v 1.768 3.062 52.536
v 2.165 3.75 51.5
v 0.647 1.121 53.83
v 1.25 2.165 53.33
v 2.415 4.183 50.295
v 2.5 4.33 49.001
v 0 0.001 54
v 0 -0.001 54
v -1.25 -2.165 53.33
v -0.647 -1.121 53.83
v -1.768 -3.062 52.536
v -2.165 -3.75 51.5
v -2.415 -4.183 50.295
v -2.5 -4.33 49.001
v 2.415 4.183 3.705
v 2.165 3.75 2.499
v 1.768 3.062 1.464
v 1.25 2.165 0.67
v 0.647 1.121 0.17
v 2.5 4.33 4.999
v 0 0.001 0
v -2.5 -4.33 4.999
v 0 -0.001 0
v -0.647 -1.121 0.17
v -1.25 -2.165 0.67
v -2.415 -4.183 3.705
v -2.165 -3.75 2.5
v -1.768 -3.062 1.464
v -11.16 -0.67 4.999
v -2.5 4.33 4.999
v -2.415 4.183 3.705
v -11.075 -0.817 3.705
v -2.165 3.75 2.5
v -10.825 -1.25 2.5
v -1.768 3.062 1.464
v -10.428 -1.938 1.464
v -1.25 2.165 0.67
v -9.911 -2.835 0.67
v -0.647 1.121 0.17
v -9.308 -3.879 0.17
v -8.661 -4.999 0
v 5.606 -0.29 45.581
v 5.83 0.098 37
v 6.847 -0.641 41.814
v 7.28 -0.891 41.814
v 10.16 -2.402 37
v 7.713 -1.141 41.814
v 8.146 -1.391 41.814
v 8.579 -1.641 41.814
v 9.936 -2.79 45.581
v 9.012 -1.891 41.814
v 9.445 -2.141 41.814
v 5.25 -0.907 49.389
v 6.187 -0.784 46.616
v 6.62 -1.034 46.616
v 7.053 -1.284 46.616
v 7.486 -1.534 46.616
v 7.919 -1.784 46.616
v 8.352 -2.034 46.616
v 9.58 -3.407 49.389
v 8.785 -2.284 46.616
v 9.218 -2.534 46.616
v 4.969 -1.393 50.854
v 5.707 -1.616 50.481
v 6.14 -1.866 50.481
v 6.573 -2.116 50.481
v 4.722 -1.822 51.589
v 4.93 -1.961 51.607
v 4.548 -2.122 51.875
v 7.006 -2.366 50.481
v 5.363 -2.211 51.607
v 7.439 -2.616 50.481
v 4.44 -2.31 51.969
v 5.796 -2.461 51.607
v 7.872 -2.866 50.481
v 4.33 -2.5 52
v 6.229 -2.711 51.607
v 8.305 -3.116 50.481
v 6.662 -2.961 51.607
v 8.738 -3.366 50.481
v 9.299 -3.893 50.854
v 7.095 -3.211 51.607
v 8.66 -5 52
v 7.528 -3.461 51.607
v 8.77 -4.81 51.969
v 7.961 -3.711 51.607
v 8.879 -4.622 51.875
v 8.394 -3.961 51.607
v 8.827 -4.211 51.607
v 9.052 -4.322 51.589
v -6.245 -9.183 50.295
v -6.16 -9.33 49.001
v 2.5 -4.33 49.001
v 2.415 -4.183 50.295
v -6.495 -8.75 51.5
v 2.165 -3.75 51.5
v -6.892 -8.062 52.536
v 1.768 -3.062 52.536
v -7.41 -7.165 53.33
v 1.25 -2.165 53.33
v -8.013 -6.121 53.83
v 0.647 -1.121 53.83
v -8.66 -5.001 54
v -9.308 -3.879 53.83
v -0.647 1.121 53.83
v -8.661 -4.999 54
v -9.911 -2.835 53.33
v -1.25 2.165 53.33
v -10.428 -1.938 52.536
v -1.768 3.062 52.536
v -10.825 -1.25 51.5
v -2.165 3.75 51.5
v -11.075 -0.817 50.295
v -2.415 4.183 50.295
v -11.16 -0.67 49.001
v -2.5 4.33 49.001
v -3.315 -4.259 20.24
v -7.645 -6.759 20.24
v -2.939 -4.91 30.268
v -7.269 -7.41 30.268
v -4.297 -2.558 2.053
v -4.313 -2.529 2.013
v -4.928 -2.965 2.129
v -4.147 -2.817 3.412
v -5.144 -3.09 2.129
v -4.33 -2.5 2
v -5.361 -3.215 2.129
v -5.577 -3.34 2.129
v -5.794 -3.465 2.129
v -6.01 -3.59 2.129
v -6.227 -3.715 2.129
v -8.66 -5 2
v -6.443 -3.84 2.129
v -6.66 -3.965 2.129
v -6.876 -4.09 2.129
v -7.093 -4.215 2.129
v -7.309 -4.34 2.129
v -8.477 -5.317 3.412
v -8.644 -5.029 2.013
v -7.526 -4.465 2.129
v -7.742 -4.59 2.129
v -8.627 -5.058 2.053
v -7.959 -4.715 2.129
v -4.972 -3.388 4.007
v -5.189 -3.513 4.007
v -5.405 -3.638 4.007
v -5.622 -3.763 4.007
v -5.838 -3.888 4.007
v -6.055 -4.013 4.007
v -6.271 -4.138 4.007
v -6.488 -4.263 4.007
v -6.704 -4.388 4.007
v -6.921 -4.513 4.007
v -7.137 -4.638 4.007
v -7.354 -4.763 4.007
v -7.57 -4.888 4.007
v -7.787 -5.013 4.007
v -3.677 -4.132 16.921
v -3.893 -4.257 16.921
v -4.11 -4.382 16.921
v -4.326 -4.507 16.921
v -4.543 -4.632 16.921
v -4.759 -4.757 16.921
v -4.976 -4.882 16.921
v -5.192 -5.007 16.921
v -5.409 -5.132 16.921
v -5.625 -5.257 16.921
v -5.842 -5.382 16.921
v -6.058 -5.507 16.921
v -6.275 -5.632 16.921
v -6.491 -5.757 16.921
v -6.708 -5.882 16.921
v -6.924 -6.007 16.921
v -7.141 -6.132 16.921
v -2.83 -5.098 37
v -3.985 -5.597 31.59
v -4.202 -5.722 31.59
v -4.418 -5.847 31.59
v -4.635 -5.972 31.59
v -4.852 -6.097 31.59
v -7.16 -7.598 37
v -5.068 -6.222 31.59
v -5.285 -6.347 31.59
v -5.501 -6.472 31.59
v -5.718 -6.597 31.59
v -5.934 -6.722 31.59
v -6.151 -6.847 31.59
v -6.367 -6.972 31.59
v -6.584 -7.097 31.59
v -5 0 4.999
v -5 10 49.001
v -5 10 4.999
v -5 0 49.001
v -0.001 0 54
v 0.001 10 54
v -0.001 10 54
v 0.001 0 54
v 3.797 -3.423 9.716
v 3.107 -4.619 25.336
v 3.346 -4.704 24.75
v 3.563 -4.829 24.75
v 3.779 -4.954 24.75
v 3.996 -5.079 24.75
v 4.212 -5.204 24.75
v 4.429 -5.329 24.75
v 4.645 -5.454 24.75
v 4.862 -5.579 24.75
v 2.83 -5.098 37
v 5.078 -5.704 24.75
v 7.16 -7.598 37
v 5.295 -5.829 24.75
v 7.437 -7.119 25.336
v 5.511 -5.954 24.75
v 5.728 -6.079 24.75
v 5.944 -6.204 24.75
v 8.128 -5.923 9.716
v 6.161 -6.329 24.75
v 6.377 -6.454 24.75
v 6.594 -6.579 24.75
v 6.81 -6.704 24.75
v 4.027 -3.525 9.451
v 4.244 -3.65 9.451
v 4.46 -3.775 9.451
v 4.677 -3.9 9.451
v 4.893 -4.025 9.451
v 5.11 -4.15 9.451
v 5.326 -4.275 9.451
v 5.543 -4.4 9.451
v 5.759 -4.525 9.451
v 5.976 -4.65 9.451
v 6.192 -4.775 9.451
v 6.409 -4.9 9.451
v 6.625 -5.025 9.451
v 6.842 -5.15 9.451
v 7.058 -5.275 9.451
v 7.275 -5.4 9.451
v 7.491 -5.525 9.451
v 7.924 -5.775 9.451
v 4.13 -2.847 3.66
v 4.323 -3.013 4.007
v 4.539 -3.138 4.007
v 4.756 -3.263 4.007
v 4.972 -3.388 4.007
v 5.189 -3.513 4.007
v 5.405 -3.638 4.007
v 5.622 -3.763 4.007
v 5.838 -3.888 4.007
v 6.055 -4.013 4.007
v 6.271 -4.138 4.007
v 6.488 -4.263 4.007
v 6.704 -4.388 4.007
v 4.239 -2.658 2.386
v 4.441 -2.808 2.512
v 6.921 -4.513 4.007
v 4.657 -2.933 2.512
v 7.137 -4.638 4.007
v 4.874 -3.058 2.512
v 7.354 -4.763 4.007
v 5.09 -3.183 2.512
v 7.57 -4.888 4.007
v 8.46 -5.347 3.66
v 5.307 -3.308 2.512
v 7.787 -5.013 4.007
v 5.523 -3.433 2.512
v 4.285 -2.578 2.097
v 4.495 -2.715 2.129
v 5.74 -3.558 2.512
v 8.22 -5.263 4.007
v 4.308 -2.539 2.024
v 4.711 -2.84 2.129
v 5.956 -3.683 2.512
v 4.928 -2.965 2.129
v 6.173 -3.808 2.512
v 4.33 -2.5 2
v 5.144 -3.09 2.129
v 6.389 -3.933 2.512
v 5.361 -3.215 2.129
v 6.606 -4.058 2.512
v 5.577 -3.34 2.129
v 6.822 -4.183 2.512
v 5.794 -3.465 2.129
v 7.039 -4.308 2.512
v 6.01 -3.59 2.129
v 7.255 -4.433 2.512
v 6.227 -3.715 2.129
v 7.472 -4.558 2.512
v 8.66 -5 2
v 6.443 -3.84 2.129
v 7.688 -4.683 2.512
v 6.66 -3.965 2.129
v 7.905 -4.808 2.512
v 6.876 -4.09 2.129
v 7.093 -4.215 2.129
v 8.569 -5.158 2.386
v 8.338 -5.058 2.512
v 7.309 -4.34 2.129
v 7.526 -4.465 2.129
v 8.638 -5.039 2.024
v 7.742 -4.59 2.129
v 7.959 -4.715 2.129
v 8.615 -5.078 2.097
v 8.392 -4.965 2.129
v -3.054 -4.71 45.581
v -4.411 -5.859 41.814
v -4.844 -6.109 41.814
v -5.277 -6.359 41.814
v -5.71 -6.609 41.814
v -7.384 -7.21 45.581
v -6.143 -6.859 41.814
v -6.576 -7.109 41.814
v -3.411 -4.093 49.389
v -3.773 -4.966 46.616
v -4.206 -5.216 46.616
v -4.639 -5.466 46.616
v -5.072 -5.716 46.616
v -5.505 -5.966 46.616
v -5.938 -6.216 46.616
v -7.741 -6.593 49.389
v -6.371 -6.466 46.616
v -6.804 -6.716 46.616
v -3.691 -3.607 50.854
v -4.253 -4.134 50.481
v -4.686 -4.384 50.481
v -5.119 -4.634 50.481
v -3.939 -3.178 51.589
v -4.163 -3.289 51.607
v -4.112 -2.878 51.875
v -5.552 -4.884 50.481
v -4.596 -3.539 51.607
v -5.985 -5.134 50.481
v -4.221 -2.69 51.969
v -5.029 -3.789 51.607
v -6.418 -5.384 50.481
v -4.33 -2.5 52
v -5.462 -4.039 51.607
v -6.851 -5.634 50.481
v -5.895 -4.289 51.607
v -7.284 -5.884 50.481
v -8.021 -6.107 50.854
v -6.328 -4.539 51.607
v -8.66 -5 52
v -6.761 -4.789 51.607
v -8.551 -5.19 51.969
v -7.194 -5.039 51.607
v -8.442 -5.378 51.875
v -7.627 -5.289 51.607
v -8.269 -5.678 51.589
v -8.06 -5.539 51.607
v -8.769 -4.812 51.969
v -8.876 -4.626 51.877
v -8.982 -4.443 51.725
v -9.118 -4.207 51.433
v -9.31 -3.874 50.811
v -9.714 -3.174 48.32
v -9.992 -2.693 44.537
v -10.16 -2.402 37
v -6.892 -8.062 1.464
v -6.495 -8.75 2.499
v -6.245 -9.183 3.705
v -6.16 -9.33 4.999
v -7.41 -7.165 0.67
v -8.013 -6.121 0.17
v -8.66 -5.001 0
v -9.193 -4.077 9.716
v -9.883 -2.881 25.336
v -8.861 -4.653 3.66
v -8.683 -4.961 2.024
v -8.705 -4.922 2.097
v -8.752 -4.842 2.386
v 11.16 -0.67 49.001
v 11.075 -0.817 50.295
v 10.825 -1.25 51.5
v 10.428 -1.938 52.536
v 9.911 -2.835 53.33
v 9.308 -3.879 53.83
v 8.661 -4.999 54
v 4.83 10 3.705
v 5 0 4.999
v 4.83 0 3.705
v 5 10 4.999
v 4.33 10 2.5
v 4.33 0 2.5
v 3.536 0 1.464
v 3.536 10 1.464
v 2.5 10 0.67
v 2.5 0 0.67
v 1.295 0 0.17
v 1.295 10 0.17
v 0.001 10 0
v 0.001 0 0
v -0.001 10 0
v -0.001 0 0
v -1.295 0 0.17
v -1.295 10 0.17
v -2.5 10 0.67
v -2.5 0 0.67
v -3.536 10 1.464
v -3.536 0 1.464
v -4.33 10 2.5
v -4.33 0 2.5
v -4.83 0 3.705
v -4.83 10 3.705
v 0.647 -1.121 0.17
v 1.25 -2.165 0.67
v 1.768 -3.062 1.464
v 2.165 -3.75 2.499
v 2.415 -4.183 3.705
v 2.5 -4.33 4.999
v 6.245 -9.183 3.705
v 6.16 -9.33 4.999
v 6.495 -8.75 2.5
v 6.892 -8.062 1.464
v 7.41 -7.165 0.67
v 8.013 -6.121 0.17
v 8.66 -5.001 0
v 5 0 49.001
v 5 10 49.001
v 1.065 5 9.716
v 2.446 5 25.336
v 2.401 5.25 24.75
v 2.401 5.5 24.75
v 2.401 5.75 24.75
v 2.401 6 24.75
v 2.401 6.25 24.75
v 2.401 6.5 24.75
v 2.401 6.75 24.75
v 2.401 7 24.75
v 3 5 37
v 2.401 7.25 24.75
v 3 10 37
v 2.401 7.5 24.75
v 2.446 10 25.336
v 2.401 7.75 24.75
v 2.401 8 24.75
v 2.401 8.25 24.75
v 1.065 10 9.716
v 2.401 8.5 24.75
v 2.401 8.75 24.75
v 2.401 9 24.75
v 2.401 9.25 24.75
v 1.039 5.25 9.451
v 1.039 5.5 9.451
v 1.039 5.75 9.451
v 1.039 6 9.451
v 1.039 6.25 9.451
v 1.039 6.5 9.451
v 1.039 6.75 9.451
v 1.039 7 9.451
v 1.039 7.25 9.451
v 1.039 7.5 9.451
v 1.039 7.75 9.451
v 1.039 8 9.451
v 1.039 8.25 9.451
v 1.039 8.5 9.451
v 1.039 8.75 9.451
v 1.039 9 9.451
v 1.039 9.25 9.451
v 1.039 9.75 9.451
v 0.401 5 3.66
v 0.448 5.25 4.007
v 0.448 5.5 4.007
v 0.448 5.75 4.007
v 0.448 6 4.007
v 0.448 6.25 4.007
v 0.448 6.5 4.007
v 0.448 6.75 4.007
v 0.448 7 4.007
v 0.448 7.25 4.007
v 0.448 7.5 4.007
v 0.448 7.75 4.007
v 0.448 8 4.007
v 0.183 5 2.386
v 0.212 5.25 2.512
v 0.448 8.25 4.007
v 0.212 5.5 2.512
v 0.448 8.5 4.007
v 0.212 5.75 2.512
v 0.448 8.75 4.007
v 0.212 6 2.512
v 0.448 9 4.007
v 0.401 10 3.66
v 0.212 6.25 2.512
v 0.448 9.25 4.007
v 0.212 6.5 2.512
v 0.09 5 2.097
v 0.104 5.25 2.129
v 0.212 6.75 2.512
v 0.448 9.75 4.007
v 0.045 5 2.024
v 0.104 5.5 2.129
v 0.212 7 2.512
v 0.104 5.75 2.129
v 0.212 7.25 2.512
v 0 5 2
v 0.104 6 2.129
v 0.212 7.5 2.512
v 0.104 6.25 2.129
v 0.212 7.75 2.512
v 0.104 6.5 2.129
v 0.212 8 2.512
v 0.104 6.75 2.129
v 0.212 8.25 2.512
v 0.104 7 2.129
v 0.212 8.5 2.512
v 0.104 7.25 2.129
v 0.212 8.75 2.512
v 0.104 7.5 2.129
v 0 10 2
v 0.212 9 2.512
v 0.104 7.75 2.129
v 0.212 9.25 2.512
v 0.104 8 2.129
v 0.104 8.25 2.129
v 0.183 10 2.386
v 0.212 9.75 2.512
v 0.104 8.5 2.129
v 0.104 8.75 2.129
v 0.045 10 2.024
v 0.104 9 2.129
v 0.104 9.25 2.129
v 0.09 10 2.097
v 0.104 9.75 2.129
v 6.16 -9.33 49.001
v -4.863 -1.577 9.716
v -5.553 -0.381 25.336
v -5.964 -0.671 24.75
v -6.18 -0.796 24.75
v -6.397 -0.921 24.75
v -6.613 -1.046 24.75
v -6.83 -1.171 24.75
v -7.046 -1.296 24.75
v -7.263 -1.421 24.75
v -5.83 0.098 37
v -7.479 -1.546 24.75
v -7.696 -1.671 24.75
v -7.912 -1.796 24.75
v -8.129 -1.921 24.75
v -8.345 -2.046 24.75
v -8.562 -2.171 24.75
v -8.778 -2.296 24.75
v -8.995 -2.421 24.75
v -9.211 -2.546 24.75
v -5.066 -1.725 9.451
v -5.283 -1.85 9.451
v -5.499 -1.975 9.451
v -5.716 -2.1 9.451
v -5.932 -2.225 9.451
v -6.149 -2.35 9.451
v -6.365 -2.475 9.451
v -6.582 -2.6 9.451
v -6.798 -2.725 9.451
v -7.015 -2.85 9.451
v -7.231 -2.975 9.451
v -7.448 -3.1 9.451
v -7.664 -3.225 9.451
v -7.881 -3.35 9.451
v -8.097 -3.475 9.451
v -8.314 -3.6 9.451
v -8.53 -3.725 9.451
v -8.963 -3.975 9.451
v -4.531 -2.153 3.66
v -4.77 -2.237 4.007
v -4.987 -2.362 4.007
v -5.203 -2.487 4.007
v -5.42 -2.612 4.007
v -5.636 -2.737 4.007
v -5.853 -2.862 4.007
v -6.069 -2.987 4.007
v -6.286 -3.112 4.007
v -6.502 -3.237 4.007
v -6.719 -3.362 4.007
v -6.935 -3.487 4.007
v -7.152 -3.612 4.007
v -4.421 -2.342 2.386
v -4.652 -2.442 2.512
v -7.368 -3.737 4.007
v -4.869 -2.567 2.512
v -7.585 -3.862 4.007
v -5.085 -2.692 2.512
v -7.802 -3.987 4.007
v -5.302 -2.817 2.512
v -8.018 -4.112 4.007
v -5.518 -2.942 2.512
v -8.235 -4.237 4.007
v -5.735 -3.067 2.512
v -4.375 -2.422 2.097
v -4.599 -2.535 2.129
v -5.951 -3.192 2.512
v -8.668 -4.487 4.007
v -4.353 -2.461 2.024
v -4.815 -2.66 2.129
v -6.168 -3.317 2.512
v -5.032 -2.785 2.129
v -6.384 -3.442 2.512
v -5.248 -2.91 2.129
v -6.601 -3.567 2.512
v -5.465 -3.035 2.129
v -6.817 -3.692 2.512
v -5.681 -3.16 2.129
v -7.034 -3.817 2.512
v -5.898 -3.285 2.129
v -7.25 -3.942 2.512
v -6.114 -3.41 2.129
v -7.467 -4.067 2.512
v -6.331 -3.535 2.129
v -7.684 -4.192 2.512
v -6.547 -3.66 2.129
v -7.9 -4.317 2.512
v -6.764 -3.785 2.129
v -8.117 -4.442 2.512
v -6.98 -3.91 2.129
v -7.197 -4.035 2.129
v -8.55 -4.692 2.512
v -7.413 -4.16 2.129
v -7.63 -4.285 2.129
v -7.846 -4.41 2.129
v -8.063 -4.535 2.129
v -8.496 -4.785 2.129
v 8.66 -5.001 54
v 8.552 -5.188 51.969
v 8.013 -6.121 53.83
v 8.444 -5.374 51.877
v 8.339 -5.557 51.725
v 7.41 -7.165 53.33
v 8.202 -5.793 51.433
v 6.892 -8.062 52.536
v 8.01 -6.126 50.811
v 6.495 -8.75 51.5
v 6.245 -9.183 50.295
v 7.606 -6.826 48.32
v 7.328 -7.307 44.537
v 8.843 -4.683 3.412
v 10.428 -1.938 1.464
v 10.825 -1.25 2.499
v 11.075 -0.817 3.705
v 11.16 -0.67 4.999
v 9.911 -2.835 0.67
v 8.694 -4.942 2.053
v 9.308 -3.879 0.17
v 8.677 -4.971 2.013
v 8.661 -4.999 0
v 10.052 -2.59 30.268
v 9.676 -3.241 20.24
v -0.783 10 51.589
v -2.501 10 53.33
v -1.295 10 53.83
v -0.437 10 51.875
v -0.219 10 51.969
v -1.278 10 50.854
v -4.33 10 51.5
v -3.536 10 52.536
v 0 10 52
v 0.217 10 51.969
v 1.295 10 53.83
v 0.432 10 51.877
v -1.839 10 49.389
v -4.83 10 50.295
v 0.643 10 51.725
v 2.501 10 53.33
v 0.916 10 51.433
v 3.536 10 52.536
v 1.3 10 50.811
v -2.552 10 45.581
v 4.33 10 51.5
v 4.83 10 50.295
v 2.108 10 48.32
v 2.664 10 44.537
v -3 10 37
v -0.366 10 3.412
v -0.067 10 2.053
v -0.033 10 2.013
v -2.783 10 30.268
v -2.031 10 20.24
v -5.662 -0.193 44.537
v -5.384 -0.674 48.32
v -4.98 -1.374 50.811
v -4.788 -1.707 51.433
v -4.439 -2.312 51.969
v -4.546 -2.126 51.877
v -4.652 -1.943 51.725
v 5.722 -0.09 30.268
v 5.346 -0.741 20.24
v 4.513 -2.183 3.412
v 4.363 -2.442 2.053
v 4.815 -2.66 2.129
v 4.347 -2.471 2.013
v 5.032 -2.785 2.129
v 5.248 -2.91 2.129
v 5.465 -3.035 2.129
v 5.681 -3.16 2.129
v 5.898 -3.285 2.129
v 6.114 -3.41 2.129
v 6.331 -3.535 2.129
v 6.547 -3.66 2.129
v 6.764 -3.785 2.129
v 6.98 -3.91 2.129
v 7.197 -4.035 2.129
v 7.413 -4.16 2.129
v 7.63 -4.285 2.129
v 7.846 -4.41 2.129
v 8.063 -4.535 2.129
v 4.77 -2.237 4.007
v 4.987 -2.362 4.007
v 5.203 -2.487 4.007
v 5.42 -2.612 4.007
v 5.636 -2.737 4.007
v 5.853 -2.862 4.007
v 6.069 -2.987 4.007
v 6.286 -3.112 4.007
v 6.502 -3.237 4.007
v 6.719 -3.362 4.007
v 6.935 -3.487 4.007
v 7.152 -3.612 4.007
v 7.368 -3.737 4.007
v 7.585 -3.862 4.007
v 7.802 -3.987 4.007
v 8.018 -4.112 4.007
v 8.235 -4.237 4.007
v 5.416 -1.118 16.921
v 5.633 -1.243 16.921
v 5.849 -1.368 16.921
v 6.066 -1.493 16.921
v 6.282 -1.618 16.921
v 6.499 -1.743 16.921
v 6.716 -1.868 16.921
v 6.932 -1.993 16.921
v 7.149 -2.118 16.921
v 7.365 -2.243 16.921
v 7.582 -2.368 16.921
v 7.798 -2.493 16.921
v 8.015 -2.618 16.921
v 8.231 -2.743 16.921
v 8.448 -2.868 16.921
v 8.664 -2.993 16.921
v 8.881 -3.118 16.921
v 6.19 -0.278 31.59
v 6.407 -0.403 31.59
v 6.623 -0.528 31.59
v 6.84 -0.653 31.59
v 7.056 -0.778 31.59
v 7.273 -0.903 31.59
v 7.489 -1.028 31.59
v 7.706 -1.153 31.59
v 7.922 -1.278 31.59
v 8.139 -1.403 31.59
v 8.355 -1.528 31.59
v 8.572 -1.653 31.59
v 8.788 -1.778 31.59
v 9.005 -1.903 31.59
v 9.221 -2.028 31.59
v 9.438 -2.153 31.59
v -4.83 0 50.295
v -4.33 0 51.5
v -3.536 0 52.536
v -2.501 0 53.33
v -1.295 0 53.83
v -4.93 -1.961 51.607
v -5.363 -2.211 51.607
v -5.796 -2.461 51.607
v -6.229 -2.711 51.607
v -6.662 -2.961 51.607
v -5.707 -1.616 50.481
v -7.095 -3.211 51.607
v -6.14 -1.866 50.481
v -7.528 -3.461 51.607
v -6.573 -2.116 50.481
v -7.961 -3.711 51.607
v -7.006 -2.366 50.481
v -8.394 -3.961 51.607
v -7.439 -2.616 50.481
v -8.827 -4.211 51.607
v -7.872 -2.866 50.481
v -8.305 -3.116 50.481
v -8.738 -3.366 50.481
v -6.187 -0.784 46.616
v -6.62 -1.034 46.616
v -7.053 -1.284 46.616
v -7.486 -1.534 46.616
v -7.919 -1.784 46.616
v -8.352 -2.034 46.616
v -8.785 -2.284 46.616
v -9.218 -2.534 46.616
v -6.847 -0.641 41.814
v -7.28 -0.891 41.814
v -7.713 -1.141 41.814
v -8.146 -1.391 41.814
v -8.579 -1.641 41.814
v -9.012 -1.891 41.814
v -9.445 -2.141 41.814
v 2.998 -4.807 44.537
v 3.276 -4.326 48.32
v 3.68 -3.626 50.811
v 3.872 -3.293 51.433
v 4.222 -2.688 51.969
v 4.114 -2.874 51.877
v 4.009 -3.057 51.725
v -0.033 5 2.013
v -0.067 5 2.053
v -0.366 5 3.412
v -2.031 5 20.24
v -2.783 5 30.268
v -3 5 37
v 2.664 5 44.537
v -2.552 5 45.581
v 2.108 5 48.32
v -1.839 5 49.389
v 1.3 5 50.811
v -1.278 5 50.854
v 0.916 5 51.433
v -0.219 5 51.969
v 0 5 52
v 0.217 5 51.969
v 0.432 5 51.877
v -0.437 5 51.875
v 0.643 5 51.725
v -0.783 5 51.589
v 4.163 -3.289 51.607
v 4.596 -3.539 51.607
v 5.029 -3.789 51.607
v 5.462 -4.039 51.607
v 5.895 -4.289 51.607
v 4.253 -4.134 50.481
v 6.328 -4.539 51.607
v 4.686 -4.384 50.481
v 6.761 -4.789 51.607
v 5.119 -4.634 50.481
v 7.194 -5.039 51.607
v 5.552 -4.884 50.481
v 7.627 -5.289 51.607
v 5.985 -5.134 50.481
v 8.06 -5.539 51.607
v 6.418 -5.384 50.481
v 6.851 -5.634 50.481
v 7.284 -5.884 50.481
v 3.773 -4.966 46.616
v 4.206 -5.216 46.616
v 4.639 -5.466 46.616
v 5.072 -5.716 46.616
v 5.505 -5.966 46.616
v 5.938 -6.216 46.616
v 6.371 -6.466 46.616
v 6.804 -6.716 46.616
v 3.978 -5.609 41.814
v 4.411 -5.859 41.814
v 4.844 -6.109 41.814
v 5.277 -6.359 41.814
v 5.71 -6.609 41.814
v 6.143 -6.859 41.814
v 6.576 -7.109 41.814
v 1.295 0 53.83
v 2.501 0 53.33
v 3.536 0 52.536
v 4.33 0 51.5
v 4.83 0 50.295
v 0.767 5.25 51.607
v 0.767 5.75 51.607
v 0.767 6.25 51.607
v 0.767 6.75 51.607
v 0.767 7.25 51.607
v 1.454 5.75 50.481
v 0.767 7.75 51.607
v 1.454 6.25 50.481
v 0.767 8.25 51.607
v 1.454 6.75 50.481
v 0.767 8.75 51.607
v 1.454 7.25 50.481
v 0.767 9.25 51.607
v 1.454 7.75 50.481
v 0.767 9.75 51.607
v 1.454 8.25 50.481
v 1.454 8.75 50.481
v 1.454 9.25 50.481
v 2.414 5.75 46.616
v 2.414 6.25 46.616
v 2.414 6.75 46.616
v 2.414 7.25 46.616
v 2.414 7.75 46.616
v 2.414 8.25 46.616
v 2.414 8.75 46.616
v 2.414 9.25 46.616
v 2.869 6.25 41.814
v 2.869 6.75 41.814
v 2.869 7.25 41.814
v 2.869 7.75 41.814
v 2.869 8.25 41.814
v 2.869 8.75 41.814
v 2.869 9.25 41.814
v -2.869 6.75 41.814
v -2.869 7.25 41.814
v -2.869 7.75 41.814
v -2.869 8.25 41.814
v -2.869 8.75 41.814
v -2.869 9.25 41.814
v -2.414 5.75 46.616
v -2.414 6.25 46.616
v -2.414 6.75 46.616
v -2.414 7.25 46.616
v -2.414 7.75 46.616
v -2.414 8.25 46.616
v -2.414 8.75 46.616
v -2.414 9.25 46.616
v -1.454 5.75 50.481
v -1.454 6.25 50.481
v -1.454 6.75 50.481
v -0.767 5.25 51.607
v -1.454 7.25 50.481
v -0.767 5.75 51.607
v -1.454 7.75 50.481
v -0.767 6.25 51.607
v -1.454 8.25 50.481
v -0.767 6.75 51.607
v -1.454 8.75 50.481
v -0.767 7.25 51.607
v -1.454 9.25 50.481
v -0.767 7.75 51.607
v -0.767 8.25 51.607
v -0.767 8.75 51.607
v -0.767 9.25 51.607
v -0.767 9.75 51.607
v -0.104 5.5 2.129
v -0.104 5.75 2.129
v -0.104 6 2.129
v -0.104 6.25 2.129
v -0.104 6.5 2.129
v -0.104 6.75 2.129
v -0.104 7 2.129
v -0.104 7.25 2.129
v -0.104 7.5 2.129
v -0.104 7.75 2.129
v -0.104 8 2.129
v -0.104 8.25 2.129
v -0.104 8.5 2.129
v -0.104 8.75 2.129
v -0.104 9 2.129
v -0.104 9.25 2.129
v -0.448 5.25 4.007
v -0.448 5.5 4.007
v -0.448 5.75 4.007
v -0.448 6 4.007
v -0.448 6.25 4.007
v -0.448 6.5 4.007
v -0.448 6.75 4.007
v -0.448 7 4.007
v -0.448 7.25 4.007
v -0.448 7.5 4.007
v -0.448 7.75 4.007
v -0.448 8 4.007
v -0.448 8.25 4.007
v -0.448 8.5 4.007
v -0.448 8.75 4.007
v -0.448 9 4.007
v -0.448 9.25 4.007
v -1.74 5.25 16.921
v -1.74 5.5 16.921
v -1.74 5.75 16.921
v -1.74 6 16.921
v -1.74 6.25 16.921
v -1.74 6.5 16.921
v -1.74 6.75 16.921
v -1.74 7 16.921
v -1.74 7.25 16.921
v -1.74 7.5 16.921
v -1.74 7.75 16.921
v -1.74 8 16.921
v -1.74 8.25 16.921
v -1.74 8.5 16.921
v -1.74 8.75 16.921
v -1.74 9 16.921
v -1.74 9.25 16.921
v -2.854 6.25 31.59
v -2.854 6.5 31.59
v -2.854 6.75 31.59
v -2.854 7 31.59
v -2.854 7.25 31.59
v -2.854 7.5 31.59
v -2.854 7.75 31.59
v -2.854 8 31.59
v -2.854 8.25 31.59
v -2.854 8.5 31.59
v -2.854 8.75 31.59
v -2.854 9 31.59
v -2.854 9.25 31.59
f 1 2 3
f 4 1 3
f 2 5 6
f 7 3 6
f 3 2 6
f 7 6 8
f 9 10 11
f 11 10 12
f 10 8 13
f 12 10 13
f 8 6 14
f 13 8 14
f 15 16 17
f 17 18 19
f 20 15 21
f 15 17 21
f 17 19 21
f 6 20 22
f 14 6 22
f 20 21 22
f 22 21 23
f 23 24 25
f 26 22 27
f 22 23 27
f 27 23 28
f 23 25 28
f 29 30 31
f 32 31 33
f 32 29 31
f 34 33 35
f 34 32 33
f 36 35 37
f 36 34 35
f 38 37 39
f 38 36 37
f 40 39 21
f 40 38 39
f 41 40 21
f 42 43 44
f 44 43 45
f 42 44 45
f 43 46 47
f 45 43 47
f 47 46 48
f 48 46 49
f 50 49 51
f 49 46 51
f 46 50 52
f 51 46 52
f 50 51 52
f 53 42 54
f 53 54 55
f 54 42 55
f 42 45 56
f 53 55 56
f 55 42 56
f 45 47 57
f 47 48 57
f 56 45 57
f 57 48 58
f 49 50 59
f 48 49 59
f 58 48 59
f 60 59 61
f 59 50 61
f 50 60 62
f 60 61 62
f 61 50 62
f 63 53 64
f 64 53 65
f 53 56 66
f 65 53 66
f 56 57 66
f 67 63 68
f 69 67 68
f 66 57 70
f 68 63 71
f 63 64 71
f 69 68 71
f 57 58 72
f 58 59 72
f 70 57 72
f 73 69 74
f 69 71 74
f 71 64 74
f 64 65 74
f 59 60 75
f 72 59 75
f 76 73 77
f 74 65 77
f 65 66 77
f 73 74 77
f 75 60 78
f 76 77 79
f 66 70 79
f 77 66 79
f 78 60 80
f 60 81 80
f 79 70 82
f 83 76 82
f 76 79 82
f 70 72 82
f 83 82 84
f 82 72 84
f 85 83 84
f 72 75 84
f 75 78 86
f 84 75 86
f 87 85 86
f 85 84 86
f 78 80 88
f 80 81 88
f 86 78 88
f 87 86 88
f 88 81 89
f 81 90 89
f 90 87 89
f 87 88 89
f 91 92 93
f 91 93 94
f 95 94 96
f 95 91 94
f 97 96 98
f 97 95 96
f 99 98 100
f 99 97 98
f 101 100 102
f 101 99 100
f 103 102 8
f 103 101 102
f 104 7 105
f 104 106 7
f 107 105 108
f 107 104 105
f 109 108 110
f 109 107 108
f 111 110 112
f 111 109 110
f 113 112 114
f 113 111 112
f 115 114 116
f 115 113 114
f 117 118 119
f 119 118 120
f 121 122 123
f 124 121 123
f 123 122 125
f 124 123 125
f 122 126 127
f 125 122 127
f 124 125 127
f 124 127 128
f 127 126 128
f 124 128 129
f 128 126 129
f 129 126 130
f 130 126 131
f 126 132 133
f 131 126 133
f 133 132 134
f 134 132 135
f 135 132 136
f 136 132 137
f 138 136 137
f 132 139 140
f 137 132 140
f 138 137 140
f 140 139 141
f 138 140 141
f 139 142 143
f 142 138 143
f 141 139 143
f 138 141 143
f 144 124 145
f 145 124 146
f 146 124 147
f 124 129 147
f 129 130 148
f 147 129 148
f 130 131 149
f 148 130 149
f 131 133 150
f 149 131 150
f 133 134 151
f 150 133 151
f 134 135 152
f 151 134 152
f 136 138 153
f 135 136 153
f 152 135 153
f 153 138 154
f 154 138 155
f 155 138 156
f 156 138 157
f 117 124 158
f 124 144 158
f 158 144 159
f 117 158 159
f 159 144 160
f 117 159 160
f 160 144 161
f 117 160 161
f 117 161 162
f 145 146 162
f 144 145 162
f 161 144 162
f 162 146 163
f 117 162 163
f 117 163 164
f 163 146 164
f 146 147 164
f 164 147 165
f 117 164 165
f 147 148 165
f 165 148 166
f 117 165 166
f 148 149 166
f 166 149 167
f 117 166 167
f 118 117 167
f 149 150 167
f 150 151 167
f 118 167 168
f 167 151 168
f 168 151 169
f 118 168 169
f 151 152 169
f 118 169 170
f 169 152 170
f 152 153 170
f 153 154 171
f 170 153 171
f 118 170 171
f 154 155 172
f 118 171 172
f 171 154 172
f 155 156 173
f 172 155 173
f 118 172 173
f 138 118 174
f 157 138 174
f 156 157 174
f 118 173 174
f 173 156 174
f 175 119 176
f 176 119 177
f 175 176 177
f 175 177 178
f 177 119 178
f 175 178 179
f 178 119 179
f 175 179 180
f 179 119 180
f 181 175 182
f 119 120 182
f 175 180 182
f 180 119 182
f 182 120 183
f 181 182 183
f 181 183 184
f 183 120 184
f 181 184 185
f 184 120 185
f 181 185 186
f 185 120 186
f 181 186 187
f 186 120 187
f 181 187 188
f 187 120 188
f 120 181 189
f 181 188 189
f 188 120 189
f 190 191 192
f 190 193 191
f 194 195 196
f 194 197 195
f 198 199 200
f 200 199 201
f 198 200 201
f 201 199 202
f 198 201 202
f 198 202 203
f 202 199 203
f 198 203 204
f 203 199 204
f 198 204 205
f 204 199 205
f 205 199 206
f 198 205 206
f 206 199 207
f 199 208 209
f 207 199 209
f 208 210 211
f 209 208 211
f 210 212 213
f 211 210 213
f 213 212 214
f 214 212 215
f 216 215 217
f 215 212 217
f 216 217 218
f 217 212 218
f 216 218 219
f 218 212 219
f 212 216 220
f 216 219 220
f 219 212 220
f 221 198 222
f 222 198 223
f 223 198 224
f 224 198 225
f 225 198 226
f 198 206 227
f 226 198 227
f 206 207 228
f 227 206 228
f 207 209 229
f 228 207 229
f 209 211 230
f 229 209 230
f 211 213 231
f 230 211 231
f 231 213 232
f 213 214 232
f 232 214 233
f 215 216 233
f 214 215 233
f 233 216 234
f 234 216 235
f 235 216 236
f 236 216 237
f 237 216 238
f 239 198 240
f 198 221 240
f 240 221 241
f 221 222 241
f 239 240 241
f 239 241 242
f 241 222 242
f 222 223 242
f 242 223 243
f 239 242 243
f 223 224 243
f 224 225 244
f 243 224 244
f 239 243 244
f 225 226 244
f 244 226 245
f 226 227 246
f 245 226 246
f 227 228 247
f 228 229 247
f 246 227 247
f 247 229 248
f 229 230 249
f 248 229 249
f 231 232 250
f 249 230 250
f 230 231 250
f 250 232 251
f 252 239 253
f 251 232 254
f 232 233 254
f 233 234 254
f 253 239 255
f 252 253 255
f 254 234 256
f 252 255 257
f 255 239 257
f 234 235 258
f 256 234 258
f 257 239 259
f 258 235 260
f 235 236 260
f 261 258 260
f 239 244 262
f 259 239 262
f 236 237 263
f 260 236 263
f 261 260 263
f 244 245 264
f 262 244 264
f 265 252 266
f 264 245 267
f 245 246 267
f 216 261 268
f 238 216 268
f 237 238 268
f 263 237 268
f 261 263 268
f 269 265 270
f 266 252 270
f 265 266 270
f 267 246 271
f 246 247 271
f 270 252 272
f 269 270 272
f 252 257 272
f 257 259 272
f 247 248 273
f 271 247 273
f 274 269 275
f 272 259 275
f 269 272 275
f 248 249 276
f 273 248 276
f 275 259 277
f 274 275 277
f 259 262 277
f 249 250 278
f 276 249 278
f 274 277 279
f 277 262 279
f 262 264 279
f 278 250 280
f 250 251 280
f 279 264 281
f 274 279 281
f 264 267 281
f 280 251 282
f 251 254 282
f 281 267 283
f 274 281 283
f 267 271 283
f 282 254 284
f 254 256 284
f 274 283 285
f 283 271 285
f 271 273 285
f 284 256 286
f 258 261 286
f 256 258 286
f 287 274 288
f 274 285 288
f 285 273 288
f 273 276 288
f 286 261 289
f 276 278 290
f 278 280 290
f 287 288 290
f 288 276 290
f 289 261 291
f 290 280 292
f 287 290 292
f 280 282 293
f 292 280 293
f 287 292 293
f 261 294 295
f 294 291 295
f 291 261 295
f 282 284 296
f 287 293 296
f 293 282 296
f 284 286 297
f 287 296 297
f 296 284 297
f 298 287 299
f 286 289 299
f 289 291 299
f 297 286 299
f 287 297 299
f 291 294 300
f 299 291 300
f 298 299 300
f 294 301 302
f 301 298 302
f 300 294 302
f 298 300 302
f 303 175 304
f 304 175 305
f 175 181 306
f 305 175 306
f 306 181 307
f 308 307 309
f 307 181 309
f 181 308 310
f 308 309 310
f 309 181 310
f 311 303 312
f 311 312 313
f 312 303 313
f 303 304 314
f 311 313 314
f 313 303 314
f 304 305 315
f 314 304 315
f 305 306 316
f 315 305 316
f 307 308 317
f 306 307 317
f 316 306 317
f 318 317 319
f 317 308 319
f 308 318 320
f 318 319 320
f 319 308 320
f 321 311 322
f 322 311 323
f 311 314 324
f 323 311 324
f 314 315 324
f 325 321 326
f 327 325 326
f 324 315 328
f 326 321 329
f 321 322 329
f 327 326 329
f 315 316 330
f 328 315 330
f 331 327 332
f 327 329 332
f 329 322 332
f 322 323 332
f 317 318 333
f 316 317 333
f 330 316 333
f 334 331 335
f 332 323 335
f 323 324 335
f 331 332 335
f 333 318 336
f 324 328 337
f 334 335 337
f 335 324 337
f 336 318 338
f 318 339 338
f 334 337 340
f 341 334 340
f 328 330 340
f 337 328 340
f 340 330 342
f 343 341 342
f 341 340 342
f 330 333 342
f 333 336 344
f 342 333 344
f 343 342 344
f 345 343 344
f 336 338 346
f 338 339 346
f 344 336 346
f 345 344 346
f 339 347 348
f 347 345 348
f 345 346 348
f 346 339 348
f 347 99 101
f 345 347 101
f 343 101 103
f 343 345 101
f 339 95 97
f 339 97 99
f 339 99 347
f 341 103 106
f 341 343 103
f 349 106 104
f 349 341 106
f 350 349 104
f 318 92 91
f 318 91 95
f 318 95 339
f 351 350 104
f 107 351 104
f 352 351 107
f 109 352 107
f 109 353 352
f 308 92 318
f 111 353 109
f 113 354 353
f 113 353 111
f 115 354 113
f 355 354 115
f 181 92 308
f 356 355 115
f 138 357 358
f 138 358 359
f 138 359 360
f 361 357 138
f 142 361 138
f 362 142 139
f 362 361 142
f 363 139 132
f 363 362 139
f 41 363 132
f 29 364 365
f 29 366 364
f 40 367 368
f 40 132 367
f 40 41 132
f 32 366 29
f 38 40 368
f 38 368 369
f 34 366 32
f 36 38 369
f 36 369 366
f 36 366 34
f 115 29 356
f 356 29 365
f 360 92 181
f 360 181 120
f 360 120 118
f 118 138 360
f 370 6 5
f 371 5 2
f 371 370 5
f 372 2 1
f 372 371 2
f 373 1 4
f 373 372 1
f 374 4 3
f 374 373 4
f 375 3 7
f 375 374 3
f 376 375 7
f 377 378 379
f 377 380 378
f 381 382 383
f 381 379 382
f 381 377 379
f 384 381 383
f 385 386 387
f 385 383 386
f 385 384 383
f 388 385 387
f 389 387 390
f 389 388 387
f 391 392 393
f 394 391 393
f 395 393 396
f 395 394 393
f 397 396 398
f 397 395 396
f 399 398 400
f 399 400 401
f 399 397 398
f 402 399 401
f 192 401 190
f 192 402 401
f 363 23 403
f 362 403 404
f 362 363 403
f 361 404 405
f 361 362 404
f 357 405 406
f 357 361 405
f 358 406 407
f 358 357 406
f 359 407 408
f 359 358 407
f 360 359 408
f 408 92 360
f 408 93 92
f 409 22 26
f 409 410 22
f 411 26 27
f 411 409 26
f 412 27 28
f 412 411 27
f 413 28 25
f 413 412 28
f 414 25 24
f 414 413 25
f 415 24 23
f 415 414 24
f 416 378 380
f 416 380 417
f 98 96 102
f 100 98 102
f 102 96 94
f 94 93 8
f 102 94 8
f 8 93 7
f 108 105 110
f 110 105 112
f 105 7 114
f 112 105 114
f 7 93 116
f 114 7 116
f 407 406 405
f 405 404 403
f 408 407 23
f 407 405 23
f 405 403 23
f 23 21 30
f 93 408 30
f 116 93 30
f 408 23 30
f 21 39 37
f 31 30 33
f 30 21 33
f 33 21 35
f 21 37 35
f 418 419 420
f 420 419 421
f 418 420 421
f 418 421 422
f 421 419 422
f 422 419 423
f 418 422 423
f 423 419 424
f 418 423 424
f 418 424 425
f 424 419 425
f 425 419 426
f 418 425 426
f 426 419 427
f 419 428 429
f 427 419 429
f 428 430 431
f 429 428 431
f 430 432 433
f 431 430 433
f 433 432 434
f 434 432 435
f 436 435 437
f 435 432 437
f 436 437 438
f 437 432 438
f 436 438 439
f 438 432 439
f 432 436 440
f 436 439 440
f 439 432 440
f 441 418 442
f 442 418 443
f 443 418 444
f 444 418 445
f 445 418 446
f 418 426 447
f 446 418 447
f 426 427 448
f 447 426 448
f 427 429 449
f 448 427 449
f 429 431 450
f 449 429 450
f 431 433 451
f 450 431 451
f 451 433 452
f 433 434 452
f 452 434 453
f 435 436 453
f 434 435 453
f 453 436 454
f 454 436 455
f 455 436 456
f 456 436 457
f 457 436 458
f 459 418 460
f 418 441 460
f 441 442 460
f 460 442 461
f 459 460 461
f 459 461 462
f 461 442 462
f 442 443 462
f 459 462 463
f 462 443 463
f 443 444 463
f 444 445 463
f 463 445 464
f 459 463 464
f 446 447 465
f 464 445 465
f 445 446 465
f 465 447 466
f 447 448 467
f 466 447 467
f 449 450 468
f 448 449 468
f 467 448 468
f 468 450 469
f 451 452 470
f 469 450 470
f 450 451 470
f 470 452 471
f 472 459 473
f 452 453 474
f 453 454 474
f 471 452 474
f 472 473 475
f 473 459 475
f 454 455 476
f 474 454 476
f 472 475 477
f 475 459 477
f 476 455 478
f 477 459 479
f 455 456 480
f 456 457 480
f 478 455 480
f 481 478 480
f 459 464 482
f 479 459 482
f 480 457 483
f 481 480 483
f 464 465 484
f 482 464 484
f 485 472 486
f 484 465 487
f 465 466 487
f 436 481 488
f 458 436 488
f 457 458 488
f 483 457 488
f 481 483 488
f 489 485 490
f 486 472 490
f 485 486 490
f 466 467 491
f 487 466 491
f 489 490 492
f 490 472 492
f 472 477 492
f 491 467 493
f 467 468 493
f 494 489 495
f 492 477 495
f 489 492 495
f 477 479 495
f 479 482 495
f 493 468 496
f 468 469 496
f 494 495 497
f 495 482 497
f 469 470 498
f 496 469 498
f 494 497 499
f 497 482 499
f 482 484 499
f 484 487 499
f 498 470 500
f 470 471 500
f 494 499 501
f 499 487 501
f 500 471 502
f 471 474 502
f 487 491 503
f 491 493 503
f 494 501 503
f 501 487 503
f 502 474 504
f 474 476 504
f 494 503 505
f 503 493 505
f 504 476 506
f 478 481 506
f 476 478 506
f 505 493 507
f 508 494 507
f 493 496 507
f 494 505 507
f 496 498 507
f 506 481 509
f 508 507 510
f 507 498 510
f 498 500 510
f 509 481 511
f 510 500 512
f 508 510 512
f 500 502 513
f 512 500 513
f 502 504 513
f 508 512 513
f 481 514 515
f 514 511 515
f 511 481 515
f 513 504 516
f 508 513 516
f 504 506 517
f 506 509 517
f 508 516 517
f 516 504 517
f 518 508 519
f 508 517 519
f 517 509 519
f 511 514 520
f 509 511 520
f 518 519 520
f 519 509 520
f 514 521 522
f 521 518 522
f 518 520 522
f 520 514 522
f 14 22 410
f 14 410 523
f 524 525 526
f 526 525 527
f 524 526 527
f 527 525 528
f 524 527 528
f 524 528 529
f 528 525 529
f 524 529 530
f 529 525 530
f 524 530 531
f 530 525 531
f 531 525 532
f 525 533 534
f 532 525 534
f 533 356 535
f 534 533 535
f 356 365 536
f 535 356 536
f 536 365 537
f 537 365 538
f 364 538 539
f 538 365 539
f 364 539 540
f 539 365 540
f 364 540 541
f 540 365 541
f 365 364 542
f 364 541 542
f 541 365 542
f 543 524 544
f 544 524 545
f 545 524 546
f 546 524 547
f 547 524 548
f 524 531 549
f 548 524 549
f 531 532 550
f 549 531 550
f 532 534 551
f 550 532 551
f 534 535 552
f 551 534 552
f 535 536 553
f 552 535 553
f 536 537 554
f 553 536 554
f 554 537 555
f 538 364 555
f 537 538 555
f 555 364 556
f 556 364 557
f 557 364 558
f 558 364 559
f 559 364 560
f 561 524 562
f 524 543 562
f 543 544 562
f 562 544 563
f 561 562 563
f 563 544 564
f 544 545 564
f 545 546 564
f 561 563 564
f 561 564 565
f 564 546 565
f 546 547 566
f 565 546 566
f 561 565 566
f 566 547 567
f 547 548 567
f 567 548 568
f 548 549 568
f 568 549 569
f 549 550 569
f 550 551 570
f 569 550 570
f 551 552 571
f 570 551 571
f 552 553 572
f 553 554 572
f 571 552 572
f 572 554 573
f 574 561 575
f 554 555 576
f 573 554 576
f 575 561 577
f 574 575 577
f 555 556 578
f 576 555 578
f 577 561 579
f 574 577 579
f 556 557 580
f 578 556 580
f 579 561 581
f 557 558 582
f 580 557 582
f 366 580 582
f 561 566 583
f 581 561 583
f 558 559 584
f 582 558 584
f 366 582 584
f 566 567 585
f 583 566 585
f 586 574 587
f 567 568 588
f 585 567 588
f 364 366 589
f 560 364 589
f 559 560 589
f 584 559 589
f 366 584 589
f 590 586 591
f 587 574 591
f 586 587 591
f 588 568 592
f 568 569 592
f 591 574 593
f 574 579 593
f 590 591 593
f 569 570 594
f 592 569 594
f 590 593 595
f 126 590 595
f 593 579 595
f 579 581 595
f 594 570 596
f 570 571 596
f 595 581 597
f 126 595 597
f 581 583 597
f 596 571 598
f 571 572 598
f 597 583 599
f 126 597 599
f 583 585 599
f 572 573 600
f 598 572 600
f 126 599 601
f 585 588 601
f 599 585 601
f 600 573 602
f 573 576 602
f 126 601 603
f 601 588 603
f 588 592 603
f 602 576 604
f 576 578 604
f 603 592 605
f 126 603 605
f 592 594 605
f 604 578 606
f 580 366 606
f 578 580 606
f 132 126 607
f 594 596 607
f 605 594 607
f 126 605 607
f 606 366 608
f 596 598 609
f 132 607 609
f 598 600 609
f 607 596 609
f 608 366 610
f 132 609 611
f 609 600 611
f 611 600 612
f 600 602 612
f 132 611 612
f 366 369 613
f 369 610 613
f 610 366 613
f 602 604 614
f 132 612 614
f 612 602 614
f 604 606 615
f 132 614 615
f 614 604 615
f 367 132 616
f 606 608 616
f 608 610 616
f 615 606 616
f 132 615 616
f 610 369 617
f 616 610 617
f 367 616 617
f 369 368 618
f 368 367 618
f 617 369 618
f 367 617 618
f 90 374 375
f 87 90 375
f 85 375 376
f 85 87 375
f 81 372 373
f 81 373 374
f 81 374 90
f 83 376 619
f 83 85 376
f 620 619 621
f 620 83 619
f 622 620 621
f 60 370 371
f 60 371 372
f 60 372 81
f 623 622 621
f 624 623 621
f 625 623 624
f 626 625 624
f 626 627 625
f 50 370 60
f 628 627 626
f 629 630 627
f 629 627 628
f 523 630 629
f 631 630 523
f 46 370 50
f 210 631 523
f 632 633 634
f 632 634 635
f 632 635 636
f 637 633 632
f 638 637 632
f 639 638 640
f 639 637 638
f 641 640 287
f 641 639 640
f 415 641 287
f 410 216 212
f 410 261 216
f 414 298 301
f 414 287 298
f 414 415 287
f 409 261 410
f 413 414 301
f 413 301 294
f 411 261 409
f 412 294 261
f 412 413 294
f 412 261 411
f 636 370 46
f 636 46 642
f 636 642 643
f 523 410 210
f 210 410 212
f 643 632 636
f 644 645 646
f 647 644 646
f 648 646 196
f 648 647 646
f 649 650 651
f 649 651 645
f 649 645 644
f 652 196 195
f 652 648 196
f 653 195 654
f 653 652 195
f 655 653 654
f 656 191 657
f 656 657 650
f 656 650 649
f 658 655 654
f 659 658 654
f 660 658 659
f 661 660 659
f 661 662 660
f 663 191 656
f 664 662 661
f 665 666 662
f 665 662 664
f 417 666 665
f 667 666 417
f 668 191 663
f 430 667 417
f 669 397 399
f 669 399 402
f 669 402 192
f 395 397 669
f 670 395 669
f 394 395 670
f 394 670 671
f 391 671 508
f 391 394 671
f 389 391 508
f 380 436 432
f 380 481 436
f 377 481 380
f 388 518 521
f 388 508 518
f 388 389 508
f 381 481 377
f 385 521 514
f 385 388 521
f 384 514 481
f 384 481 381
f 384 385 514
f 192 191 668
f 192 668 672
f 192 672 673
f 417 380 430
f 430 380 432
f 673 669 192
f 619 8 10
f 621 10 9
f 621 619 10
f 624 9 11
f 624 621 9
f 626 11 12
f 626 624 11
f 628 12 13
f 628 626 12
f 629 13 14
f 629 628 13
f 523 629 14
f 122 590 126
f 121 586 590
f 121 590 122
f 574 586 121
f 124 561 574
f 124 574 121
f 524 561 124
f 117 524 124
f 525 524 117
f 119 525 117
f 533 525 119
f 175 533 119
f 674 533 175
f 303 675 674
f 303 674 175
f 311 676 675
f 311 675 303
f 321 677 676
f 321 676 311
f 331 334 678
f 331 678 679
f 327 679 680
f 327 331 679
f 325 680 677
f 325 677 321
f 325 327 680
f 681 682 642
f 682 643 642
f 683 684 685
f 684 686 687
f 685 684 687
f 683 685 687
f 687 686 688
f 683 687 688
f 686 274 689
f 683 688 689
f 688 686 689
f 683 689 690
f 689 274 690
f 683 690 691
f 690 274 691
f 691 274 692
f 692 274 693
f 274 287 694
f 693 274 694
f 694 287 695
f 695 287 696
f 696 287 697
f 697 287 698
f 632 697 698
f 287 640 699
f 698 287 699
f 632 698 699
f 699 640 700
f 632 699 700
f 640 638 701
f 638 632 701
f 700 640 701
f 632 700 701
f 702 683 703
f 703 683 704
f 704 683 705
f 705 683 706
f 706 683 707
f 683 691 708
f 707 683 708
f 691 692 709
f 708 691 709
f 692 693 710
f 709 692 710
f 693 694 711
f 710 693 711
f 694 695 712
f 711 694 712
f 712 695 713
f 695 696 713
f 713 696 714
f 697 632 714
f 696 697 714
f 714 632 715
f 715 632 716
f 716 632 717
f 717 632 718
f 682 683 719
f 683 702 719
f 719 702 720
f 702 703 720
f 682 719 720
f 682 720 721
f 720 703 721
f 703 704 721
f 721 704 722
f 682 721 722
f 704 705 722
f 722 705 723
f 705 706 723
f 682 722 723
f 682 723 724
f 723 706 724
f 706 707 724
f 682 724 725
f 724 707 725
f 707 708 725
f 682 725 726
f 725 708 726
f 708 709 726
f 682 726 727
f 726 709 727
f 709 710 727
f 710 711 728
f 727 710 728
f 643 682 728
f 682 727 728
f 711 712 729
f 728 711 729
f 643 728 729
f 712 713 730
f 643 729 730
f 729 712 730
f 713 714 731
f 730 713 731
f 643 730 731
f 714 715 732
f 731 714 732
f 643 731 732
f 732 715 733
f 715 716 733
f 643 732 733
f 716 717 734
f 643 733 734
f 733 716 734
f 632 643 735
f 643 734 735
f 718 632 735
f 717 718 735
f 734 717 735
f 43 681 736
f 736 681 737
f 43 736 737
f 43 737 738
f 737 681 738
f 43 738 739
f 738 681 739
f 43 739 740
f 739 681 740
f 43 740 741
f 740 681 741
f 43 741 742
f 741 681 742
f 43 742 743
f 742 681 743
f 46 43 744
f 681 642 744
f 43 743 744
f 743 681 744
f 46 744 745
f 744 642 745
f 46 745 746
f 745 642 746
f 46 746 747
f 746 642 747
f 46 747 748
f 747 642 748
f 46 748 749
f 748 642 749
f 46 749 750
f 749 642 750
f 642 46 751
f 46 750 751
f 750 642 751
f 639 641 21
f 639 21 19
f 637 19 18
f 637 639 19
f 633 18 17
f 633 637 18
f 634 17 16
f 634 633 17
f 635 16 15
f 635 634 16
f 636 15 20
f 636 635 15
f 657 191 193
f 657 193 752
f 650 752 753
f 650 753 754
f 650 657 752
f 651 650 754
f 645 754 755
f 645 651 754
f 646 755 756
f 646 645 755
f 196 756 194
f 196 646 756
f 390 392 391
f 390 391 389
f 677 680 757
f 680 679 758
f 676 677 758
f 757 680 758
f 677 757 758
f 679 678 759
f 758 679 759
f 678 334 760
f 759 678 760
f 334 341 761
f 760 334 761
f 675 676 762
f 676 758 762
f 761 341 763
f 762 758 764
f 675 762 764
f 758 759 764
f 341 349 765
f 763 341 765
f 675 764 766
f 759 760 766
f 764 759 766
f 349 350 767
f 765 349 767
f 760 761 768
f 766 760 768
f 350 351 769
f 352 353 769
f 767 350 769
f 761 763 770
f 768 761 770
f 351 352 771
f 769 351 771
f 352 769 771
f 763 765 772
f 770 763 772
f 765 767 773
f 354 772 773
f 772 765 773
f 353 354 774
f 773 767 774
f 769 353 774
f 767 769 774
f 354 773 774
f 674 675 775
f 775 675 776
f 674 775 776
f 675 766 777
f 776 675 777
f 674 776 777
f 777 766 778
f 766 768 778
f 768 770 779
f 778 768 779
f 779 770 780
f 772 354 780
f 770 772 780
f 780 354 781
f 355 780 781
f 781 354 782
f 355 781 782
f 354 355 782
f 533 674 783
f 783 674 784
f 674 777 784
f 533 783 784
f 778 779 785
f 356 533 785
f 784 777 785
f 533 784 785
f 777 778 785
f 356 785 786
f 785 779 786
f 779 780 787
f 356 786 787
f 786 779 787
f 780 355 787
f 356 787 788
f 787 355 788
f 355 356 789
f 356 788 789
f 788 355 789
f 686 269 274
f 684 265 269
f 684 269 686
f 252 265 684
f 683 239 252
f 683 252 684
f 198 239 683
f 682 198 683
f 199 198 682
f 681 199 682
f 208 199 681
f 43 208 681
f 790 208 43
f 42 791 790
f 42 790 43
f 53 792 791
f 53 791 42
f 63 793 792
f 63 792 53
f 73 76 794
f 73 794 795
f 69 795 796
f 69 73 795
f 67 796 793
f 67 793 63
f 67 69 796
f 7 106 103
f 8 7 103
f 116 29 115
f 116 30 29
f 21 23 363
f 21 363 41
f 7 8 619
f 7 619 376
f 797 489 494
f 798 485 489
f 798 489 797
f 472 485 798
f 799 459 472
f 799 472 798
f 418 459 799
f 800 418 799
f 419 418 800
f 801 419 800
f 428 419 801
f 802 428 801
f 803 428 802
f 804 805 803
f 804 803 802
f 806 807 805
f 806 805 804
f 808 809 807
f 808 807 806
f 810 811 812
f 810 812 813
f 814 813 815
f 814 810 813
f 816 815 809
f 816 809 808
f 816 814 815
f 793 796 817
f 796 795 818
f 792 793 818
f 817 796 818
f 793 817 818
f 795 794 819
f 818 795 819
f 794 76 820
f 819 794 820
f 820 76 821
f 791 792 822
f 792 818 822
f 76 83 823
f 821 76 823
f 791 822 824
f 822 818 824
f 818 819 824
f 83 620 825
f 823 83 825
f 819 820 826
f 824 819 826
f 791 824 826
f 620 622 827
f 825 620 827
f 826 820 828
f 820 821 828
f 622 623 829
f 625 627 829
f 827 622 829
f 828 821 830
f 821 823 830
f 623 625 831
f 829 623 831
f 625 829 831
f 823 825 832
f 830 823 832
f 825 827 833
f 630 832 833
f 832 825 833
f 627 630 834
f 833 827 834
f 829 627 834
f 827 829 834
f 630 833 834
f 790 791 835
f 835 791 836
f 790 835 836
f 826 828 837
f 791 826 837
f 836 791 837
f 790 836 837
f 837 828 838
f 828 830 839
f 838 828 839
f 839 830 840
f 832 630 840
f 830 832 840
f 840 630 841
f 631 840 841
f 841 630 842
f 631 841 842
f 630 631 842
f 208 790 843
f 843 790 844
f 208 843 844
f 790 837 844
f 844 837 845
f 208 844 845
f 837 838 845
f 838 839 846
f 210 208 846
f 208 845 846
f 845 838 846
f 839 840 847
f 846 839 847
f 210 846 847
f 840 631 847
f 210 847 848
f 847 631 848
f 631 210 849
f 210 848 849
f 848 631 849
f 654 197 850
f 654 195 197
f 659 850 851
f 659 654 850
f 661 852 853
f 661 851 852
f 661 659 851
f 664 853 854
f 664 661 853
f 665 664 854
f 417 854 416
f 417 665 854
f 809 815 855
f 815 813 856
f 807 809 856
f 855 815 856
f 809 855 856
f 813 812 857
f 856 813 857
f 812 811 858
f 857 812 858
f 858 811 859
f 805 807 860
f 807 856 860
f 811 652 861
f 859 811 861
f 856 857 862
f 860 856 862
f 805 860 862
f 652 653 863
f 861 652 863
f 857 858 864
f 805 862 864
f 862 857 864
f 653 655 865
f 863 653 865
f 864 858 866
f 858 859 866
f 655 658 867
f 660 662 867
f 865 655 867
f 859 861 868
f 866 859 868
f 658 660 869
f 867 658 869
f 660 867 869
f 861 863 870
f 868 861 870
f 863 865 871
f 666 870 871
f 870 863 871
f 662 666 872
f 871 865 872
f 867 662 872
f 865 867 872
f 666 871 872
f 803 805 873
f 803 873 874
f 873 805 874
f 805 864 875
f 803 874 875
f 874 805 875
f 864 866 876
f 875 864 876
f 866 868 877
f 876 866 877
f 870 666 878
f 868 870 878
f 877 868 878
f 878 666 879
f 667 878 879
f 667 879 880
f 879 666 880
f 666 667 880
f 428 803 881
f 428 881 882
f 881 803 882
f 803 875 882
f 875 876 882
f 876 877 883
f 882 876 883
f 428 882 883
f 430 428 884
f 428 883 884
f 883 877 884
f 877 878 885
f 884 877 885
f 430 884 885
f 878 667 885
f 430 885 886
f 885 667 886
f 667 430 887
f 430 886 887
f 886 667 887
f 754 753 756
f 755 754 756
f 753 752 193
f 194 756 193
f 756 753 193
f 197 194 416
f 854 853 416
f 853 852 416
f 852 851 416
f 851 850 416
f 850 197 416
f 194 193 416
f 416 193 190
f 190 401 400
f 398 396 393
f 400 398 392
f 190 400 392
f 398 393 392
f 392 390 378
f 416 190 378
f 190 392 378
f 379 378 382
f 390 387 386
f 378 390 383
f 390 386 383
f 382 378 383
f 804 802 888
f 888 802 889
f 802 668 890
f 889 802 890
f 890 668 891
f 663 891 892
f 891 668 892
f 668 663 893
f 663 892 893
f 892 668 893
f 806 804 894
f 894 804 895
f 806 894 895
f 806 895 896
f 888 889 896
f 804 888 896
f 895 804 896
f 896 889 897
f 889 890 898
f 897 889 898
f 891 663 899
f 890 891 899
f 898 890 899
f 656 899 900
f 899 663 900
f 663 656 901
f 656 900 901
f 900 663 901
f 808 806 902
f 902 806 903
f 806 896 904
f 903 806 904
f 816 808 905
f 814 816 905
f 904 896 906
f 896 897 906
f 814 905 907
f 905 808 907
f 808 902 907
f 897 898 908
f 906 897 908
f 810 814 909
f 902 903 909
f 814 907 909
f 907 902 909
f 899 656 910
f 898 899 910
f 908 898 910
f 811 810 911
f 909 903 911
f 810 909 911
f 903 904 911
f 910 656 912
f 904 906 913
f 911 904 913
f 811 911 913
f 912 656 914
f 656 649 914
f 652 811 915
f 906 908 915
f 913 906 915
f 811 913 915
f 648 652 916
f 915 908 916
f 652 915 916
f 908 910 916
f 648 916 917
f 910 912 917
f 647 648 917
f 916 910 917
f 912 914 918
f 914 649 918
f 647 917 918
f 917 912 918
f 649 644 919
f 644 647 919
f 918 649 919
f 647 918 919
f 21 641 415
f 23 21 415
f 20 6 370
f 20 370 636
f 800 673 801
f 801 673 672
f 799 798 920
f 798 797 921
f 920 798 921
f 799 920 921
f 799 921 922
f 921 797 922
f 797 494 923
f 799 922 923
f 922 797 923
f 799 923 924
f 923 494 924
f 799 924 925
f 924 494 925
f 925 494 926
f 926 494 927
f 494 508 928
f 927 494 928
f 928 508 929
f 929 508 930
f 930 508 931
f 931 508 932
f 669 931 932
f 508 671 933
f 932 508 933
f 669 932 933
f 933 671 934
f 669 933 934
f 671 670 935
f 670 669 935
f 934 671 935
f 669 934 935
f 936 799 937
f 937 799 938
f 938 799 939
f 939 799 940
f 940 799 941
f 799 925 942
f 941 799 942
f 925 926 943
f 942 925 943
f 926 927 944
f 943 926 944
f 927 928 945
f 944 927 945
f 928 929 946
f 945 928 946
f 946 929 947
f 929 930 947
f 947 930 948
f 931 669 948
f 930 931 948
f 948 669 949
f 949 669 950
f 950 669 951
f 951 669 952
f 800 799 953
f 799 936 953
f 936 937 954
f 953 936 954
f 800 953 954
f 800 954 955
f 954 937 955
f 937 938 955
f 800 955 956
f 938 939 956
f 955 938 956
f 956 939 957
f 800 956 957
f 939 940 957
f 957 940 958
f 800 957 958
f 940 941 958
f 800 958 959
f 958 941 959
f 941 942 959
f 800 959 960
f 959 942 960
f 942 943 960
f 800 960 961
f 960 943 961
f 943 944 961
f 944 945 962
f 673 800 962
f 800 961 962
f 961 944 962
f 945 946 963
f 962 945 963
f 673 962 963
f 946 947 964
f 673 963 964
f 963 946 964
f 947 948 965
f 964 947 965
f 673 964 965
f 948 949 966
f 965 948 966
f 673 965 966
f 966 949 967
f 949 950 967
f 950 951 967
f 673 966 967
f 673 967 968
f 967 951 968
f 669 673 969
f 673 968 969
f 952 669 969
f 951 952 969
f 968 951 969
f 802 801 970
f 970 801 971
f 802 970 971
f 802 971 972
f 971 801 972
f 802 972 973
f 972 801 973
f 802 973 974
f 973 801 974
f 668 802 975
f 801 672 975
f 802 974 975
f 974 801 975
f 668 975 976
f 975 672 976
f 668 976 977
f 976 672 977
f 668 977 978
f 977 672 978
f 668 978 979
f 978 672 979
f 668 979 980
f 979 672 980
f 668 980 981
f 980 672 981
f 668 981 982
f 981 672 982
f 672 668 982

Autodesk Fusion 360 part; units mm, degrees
sketch "Sketch1" plane through (0, 0, 0) normal (0, 1, 0) x (1, 0, 0)
  line L0 (-5, 0) -> (5, 0)
  line L1 (5, 0) -> (5, -54)
  line L2 (5, -54) -> (-5, -54)
  line L3 (-5, -54) -> (-5, 0)
  dimension "d1" = 10
  dimension "d2" = 54
  dimension "d3" = 5
extrude "Extrude1" add sketch "Sketch1" along normal blind 10 makes body 1
sketch "Sketch2" plane through (0, 10, 0) normal (0, 1, 0) x (-1, 0, 0)
  line L0 (5, 54) -> (-5, 54)
  line L1 (-5, 54) -> (-5, 0)
  line L2 (-5, 0) -> (5, 0)
  line L3 (5, 0) -> (5, 54)
  spline S0 degree 5 poles (0, 2) (0.0829, 2) (0.2486, 2.4125) (0.5186, 4.2686) (1.0074, 8.9269) (1.7486, 16.855) (2.4545, 25.0304) (2.9459, 32.0654) (3.0612, 37.1221) (2.9371, 41.6893) (2.5475, 46.8402) (1.6202, 51.0987) (0, 52.8664) (-1.6202, 51.0987) (-2.5475, 46.8402) (-2.9371, 41.6893) (-3.0612, 37.1221) (-2.9459, 32.0654) (-2.4545, 25.0304) (-1.7486, 16.855) (-1.0074, 8.9269) (-0.5186, 4.2686) (-0.2486, 2.4125) (-0.0829, 2) (0, 2) knots 0 0 0 0 0 0 0.05 0.1 0.15 0.2 0.25 0.3 0.35 0.4 0.45 0.5 0.55 0.6 0.65 0.7 0.75 0.8 0.85 0.9 0.95 1 1 1 1 1 1
  line L4 (3, 32) -> (3, 42)
  line L5 (-3, 42) -> (-3, 32)
  line L6 (1.5, 52) -> (-1.5, 52)
  line L7 (-0.25, 2) -> (0.25, 2)
  point P0 (3, 37)
  point P1 (0, 52)
  point P2 (-3, 37)
  dimension "d13" = 35
  dimension "d14" = 15
  dimension "d15" = 0.5
  dimension "d16" = 3
  dimension "d17" = 10
  dimension "d18" = 6
  dimension "d19" = 3
  dimension "d20" = 2
extrude "Extrude2" cut sketch "Sketch2" against normal blind 5 contours S0 bodies 1
pattern_circular "C-Pattern1" count 3 over 360 about axis through (0, 0, 1.75) along (0, 0, 1) of bodies 1 makes body 2 at (0.8333, -1.4434, 18) makes body 3 at (0.8333, 1.4434, 18)
fillet "Fillet1" radius 5 12 edges at (5, 5, 54) (-5, 5, 54) (5, 5, 0) (-5, 5, 0) (-6.8301, 1.8301, 54) (-1.8301, -6.8301, 54) (-1.8301, -6.8301, 0) (-6.8301, 1.8301, 0) (6.8301, 1.8301, 54) (1.8301, -6.8301, 54) (1.8301, -6.8301, 0) (6.8301, 1.8301, 0) on bodies 1 2 3
